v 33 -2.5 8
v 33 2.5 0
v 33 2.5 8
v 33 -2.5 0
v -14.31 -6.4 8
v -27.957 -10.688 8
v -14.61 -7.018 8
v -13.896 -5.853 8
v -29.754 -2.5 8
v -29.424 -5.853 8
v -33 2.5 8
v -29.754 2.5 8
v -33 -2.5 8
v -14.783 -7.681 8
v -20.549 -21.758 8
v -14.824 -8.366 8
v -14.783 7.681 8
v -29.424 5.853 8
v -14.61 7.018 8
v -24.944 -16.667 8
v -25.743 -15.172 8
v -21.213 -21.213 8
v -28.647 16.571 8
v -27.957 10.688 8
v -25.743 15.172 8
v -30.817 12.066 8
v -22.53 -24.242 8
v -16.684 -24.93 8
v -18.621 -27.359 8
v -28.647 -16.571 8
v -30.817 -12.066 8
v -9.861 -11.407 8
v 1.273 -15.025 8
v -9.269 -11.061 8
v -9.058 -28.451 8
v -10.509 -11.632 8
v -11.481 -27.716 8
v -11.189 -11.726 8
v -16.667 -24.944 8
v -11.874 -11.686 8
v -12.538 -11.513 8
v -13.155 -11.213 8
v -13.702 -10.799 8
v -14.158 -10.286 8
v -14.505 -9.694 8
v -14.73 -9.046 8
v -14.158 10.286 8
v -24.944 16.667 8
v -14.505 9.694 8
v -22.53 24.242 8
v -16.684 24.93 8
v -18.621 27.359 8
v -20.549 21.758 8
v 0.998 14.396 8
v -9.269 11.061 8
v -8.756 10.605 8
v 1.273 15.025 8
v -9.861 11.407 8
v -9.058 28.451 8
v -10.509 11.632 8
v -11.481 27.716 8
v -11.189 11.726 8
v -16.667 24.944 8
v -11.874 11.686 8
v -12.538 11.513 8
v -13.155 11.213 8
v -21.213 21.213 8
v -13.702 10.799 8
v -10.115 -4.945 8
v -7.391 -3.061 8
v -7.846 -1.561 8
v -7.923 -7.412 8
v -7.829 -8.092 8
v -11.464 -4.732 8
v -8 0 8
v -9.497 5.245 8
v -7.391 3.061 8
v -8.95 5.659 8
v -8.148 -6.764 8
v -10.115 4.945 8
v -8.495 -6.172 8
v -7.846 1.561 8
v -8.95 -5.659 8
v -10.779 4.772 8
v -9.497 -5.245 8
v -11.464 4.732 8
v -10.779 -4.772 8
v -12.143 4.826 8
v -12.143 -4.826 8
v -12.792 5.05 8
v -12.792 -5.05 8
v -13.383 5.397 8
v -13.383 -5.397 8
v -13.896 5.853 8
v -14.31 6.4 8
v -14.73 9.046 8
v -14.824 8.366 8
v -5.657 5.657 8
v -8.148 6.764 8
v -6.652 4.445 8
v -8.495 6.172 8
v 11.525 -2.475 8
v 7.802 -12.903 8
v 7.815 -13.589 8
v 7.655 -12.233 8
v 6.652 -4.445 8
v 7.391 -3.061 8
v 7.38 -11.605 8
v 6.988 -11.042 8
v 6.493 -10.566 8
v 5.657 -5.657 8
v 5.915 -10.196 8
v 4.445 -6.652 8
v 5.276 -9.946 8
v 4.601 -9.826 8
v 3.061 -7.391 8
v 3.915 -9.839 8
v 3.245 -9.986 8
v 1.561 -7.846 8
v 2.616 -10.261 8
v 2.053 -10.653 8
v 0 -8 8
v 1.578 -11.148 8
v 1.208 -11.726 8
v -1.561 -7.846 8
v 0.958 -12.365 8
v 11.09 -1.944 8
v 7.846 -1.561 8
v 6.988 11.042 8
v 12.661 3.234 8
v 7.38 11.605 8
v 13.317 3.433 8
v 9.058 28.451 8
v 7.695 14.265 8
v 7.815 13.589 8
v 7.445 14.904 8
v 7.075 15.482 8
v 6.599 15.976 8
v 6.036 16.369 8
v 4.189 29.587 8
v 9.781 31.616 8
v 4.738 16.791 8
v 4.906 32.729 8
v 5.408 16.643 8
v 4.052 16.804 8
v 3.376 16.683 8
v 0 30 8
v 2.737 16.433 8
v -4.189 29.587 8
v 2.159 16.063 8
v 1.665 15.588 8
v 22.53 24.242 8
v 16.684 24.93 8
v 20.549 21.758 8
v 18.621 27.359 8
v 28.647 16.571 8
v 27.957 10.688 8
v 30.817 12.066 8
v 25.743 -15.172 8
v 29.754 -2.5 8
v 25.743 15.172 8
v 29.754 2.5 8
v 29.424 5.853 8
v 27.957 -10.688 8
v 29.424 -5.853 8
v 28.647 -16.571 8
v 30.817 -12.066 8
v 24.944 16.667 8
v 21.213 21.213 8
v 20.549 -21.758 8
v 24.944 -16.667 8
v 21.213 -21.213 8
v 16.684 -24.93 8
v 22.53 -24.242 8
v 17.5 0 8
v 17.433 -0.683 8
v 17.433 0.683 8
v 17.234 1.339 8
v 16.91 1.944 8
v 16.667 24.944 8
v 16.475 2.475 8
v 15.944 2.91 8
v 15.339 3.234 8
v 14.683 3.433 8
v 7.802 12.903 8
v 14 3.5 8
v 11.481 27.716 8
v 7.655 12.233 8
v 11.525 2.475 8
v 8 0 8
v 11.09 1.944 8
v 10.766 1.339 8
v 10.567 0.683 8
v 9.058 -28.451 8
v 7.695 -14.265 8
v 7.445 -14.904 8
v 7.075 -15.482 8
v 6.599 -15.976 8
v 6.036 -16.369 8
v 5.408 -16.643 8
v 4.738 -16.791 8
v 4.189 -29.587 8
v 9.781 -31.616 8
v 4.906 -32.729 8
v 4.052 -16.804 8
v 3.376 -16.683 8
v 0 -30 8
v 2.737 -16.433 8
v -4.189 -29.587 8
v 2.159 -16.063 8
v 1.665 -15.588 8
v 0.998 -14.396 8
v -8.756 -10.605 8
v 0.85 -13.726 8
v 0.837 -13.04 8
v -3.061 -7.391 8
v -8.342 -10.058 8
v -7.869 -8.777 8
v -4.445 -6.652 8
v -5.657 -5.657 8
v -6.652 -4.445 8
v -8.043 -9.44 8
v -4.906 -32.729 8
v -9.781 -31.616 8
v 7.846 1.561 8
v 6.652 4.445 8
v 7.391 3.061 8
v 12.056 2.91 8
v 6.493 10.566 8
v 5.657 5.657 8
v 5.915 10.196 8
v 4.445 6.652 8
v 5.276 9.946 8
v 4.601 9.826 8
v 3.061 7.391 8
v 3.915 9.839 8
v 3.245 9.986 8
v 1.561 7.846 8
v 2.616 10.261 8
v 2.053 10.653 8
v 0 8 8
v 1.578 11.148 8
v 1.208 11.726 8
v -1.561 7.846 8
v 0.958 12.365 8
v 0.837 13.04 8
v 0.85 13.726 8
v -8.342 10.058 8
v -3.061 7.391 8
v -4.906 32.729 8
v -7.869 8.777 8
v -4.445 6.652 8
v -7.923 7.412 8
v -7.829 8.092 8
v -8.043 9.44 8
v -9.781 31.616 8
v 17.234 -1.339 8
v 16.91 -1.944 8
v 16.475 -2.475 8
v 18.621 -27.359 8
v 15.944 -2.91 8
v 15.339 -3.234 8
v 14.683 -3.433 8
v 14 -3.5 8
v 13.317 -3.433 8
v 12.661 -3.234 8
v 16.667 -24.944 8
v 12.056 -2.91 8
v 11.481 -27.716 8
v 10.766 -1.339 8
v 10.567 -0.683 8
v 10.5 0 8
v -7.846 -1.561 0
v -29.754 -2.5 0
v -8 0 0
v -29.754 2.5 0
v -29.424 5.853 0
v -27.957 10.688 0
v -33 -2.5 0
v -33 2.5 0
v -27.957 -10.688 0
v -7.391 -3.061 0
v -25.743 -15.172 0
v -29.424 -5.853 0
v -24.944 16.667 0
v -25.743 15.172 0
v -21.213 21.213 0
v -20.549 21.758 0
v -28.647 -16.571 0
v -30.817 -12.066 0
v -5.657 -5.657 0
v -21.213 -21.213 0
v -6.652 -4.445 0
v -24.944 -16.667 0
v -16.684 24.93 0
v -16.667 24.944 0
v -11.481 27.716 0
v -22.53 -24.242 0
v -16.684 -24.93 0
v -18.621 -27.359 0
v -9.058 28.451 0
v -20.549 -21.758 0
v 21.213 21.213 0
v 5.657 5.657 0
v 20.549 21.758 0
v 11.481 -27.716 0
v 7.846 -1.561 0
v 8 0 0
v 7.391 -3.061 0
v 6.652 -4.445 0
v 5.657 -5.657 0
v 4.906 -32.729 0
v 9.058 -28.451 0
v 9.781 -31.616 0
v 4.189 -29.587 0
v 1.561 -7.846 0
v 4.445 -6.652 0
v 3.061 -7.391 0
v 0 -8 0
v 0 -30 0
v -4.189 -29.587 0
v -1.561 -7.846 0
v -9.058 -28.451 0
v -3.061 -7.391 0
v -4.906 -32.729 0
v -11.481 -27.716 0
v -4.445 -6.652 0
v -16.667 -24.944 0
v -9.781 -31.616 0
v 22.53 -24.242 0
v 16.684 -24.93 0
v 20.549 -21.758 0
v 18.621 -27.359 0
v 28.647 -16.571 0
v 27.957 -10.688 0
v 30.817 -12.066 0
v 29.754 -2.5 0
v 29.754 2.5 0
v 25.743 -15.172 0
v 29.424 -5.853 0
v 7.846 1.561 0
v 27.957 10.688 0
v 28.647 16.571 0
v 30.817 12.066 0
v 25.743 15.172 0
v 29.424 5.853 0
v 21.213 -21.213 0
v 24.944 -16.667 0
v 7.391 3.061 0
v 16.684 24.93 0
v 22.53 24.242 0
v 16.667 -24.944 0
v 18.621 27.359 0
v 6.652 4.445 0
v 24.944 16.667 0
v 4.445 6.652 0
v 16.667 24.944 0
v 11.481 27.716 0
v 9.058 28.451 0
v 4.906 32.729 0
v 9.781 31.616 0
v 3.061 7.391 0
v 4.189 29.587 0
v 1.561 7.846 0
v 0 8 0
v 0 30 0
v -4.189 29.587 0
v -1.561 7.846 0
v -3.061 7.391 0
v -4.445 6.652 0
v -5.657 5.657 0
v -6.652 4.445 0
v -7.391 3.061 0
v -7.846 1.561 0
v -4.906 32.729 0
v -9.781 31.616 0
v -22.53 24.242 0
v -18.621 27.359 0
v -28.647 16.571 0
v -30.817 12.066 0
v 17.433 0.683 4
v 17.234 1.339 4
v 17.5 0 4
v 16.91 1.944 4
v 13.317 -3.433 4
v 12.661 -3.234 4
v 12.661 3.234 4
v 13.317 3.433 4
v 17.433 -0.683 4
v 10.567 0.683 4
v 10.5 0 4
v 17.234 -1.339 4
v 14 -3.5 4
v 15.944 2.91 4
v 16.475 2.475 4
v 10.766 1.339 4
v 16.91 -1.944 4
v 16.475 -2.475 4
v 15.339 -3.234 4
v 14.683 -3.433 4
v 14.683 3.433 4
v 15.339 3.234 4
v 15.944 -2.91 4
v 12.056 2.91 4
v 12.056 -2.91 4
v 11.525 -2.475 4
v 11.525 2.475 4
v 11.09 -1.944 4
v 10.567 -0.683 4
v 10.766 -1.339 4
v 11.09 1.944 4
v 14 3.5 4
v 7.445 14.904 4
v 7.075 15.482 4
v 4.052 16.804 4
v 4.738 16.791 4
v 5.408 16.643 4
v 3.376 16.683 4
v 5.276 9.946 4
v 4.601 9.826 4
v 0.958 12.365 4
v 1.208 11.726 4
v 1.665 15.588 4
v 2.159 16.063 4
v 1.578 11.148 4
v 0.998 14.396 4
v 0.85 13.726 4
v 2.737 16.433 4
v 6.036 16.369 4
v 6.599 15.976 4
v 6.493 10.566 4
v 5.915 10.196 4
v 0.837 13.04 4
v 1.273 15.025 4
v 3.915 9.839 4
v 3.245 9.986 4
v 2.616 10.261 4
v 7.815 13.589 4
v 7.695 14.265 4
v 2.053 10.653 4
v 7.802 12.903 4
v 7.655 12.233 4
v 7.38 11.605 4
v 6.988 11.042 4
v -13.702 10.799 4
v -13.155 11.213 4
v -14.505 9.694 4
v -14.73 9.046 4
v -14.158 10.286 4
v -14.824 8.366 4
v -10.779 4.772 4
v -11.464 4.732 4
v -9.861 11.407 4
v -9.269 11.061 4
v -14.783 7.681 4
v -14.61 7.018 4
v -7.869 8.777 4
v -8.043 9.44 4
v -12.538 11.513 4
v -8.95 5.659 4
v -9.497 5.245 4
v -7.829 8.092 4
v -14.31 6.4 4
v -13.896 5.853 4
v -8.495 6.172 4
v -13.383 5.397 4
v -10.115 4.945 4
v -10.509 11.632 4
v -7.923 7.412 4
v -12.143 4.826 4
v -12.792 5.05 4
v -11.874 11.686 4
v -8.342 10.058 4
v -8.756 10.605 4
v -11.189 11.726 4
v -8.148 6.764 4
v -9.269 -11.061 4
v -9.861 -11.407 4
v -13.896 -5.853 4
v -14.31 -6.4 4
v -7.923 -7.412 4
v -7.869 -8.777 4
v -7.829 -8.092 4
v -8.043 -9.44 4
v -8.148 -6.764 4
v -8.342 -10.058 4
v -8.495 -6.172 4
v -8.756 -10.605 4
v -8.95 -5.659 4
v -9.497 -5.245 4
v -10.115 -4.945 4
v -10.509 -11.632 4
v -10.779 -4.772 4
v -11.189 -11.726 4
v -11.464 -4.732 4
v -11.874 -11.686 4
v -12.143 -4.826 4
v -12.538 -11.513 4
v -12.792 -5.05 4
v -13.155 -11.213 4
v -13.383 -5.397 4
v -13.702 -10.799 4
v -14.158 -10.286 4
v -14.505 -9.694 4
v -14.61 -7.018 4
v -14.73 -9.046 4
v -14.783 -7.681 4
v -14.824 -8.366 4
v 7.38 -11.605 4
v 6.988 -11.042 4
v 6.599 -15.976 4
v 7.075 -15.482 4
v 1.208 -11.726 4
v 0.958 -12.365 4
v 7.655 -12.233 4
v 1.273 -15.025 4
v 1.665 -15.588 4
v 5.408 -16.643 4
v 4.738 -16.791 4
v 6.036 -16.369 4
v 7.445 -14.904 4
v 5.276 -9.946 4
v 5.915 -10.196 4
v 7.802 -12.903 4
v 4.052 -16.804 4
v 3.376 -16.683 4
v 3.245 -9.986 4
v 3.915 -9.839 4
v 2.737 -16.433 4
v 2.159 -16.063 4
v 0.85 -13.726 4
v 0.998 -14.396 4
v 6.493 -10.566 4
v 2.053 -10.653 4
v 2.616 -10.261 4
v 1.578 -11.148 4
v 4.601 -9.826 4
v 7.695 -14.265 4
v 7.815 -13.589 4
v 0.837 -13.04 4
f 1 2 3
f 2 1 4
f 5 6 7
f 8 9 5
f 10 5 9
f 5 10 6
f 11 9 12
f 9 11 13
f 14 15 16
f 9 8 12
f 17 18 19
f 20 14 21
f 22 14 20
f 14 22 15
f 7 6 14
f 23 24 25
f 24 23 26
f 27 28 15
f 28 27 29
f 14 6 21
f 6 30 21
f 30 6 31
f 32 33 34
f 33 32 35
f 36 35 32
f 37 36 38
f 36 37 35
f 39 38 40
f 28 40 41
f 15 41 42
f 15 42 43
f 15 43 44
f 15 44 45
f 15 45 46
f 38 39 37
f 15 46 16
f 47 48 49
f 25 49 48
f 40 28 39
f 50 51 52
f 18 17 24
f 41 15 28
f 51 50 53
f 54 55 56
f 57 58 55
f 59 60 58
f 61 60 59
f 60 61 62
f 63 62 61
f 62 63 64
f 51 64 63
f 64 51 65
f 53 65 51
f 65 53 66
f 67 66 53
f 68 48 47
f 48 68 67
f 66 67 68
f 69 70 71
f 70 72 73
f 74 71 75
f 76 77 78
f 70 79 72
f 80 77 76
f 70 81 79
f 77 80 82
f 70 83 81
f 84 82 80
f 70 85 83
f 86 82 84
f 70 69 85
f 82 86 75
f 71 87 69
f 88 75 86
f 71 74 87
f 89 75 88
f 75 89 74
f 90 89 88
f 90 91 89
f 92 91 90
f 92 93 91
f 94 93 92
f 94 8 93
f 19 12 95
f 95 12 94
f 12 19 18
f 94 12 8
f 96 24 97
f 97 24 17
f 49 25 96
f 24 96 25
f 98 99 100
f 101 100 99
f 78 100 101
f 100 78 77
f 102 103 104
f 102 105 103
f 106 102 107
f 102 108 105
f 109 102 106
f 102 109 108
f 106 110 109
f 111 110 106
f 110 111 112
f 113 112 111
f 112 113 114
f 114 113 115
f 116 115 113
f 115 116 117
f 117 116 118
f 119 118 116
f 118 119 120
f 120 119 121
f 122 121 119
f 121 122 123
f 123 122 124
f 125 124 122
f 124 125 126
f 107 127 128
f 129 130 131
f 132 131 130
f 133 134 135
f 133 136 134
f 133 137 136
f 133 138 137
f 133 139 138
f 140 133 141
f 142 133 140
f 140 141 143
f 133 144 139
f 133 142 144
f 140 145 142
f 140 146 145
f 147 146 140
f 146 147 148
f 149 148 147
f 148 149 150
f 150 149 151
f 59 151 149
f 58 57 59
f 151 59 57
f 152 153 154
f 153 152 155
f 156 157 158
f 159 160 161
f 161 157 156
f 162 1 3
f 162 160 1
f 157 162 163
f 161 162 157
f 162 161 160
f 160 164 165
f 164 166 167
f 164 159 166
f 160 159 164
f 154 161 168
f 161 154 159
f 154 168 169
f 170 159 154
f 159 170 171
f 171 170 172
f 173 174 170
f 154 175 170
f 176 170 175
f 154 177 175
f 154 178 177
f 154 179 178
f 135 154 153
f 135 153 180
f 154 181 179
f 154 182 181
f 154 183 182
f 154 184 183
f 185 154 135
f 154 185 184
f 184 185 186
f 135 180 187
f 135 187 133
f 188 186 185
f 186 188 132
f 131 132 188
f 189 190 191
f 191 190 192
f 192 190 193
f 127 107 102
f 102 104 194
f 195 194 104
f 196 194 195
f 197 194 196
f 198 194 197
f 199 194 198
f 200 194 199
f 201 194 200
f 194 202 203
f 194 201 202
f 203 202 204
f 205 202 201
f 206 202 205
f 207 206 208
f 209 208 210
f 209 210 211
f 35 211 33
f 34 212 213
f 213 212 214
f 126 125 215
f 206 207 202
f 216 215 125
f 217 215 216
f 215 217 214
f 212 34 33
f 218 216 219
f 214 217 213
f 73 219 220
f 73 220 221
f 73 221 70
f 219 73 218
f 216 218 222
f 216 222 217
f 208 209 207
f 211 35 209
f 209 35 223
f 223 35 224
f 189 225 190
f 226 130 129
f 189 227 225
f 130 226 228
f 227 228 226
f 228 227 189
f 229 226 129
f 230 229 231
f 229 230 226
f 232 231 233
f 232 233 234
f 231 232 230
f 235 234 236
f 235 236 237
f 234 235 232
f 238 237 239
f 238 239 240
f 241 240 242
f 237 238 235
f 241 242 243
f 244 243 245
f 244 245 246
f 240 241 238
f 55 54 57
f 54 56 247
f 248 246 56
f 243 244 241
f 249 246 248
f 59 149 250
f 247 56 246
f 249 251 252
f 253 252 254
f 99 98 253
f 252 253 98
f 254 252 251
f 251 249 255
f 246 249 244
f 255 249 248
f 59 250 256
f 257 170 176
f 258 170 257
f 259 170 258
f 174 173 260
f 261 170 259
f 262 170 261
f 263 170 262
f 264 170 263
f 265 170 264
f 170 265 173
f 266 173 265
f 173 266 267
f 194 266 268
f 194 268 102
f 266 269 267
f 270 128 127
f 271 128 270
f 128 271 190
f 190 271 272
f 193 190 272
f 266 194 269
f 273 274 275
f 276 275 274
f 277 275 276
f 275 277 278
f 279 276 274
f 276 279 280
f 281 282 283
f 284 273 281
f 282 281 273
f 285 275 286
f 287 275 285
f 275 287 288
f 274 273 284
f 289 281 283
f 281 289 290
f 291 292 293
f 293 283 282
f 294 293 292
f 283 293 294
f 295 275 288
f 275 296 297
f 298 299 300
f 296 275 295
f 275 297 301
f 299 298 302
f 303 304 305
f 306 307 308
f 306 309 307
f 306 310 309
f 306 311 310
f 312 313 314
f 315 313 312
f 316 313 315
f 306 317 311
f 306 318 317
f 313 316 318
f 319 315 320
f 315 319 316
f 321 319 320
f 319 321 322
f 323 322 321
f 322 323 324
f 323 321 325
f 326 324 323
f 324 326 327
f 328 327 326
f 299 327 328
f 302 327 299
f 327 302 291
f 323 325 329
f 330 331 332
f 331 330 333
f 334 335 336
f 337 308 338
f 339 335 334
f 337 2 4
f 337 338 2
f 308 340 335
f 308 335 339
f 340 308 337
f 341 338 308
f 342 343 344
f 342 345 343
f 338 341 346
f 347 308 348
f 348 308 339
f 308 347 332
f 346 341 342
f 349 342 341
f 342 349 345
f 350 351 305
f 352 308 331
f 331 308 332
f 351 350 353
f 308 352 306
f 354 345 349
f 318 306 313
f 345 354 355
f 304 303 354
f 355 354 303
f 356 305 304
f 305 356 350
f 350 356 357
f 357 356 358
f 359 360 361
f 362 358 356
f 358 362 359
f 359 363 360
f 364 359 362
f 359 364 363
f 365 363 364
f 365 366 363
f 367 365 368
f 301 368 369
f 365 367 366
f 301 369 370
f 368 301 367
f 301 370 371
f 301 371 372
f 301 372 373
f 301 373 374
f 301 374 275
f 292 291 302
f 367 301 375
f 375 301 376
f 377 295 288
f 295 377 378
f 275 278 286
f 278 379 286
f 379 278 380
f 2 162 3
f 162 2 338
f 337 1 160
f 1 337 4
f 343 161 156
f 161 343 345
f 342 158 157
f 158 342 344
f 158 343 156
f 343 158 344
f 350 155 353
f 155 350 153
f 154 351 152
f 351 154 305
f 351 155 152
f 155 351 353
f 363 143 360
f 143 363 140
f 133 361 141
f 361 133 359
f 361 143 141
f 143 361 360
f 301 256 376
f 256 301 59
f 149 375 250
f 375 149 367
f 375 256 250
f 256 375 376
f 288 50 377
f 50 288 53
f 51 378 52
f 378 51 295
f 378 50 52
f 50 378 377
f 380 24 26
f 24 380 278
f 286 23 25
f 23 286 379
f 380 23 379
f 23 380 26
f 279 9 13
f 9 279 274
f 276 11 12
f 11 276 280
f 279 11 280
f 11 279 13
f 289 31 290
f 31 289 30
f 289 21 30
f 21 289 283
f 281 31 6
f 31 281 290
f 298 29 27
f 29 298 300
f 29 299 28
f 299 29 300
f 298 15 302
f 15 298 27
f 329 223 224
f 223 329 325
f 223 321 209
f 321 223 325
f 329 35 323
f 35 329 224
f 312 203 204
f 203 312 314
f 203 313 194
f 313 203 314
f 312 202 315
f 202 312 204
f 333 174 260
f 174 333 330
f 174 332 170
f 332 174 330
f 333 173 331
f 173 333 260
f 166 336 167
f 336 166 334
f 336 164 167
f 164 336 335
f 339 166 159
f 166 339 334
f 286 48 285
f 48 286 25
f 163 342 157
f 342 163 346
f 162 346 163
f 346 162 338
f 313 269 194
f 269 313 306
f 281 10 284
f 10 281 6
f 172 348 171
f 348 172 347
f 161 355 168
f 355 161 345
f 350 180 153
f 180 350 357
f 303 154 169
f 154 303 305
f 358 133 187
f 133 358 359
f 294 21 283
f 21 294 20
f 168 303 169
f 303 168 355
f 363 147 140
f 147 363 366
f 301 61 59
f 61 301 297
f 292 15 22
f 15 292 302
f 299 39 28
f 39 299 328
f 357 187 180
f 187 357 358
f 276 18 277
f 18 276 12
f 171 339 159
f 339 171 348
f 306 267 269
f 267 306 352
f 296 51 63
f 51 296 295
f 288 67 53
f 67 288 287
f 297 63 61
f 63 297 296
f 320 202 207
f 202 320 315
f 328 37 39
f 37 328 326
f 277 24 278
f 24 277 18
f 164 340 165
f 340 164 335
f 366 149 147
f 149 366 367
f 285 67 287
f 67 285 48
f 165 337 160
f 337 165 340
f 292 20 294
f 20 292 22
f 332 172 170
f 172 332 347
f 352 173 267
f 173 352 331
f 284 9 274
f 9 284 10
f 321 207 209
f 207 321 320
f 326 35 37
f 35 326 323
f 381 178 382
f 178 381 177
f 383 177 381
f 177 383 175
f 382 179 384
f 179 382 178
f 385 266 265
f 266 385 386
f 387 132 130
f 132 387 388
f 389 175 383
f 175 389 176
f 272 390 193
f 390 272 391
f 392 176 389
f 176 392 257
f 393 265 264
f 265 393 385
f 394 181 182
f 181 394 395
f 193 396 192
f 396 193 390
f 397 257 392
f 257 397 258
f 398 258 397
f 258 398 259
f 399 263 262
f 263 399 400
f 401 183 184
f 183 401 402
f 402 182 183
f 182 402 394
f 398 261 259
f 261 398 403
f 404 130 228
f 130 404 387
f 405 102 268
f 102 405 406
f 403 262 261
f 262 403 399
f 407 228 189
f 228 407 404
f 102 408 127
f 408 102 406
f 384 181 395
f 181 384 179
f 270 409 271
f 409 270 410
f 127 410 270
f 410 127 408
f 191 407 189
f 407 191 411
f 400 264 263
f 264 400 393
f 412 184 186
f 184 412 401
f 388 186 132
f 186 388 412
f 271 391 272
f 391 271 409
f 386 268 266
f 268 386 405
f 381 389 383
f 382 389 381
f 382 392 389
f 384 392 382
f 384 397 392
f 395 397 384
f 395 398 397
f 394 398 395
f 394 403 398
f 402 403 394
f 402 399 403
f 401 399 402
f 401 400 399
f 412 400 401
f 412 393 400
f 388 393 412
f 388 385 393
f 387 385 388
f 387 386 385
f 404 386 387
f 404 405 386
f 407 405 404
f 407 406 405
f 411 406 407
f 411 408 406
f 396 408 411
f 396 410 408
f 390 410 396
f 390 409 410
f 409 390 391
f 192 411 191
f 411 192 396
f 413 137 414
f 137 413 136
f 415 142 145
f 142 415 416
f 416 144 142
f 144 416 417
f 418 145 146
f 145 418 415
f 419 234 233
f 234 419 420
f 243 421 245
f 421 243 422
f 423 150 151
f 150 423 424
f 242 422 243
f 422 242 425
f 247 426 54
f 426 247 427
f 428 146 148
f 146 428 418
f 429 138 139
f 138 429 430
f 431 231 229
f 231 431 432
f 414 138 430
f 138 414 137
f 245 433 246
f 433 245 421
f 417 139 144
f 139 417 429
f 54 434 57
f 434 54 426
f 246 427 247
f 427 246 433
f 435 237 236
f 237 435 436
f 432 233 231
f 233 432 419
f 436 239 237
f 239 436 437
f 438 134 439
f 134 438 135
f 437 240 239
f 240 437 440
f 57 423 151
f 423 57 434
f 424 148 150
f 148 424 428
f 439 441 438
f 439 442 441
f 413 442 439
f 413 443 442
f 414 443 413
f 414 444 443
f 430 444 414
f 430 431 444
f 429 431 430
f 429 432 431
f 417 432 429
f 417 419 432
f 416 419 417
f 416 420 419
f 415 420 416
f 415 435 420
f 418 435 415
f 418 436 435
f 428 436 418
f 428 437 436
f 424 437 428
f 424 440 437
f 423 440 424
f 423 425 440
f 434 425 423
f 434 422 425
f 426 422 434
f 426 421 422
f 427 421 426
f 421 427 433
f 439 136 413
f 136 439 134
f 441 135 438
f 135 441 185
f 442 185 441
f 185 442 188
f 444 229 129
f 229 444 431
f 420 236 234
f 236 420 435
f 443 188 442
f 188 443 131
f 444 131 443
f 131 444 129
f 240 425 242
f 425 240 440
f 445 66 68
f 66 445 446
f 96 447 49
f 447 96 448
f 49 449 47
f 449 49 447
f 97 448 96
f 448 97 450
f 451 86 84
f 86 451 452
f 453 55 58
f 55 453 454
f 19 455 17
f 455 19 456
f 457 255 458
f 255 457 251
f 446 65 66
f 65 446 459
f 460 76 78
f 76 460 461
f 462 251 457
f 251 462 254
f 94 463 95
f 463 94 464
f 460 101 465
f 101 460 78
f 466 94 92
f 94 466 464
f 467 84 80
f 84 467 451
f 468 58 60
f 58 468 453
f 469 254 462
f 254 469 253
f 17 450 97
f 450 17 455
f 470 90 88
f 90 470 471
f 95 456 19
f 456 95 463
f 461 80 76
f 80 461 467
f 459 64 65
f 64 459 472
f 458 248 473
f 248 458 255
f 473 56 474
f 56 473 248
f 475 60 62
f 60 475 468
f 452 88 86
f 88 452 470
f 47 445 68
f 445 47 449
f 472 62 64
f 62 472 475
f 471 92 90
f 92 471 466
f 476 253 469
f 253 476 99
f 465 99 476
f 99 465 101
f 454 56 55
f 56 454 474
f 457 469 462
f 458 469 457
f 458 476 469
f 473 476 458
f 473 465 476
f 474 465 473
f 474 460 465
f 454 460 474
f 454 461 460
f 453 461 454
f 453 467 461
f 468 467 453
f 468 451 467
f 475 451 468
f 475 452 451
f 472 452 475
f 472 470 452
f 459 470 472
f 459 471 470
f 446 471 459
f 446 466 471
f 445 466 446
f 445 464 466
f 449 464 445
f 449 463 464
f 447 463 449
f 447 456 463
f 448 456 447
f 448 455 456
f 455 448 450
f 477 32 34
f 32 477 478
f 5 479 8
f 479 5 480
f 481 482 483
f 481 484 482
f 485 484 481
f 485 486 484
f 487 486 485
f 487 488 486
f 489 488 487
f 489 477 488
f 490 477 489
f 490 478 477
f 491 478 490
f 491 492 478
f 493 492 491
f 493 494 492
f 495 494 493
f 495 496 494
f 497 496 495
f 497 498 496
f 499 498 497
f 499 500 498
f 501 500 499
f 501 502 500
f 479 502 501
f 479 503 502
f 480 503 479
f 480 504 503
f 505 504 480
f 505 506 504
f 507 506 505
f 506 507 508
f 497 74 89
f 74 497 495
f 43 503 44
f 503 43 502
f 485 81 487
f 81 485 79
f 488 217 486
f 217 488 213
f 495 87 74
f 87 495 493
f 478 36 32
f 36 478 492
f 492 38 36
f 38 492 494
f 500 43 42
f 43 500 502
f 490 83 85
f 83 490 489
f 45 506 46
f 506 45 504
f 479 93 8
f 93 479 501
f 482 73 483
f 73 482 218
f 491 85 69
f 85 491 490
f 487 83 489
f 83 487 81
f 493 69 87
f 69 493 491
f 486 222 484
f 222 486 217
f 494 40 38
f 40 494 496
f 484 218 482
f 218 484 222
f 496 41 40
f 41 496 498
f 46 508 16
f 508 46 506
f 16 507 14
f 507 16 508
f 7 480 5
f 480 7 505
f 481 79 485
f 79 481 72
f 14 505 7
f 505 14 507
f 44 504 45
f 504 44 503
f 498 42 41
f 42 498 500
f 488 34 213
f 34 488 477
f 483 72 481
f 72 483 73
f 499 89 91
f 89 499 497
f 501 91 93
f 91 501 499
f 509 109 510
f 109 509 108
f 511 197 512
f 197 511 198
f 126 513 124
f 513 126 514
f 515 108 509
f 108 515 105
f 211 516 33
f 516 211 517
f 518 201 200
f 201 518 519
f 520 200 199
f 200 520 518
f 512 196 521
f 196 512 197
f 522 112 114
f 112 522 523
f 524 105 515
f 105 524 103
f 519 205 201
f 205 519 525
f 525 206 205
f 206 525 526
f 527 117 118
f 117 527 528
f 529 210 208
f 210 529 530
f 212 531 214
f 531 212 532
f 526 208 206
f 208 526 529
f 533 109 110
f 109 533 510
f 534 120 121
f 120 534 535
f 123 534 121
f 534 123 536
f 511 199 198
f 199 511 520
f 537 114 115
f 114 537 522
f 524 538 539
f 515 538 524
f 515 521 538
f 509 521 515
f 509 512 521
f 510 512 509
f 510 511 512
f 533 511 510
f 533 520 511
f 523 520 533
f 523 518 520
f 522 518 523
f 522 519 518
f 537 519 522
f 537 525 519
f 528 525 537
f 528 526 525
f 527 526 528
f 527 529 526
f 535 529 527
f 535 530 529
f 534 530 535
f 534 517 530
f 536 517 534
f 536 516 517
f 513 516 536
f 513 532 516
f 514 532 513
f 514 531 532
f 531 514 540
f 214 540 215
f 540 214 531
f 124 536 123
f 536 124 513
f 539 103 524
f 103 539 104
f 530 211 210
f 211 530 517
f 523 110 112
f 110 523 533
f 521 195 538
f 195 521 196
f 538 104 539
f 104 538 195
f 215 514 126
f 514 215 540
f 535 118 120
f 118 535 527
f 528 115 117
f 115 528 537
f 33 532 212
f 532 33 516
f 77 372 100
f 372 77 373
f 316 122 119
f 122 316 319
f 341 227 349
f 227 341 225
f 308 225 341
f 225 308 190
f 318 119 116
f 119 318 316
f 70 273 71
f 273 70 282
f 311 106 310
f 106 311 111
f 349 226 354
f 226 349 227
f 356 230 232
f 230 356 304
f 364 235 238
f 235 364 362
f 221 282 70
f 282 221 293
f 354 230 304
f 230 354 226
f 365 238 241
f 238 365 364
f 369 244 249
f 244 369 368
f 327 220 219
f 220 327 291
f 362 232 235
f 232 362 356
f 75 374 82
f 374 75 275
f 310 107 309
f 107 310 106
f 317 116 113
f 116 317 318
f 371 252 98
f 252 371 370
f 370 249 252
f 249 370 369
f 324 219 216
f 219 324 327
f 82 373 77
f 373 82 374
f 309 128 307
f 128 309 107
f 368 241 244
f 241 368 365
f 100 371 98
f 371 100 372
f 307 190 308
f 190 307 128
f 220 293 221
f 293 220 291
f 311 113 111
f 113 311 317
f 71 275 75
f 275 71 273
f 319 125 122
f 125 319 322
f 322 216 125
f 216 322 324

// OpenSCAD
$fn = 32;

// ----------------------------------------------------------------------
// Spur blank: lightened gear blank
// ----------------------------------------------------------------------

// --- parameters (mm) ---
disc_r = 30;              // blank root radius
disc_t = 8;               // blank thickness
n_teeth = 14;             // stub tooth count
tooth_w = 5;              // tooth width at the root
tooth_h = 3;              // tooth height above the root
bore_r = 8;               // central bore radius
ring_r = 14;              // lightening pocket ring radius
pocket_r = 3.5;           // lightening pocket radius

out_r = disc_r + tooth_h;  // tip radius
bbox_x = 66.0;  // measured width over the teeth
bbox_y = 65.46;  // measured depth over the teeth

difference() {
union() {
  cylinder(r = disc_r, h = disc_t);
  for (i = [0 : n_teeth - 1])
    rotate([0, 0, i * 360 / n_teeth])
      translate([disc_r - 1, -tooth_w / 2, 0])
        cube([tooth_h + 1, tooth_w, disc_t]);
}
  translate([0, 0, -1]) cylinder(r = bore_r, h = disc_t + 2);
  for (i = [0 : 5])
    rotate([0, 0, i * 72])
      translate([ring_r, 0, disc_t - 4])
        cylinder(r = pocket_r, h = 5);
}
